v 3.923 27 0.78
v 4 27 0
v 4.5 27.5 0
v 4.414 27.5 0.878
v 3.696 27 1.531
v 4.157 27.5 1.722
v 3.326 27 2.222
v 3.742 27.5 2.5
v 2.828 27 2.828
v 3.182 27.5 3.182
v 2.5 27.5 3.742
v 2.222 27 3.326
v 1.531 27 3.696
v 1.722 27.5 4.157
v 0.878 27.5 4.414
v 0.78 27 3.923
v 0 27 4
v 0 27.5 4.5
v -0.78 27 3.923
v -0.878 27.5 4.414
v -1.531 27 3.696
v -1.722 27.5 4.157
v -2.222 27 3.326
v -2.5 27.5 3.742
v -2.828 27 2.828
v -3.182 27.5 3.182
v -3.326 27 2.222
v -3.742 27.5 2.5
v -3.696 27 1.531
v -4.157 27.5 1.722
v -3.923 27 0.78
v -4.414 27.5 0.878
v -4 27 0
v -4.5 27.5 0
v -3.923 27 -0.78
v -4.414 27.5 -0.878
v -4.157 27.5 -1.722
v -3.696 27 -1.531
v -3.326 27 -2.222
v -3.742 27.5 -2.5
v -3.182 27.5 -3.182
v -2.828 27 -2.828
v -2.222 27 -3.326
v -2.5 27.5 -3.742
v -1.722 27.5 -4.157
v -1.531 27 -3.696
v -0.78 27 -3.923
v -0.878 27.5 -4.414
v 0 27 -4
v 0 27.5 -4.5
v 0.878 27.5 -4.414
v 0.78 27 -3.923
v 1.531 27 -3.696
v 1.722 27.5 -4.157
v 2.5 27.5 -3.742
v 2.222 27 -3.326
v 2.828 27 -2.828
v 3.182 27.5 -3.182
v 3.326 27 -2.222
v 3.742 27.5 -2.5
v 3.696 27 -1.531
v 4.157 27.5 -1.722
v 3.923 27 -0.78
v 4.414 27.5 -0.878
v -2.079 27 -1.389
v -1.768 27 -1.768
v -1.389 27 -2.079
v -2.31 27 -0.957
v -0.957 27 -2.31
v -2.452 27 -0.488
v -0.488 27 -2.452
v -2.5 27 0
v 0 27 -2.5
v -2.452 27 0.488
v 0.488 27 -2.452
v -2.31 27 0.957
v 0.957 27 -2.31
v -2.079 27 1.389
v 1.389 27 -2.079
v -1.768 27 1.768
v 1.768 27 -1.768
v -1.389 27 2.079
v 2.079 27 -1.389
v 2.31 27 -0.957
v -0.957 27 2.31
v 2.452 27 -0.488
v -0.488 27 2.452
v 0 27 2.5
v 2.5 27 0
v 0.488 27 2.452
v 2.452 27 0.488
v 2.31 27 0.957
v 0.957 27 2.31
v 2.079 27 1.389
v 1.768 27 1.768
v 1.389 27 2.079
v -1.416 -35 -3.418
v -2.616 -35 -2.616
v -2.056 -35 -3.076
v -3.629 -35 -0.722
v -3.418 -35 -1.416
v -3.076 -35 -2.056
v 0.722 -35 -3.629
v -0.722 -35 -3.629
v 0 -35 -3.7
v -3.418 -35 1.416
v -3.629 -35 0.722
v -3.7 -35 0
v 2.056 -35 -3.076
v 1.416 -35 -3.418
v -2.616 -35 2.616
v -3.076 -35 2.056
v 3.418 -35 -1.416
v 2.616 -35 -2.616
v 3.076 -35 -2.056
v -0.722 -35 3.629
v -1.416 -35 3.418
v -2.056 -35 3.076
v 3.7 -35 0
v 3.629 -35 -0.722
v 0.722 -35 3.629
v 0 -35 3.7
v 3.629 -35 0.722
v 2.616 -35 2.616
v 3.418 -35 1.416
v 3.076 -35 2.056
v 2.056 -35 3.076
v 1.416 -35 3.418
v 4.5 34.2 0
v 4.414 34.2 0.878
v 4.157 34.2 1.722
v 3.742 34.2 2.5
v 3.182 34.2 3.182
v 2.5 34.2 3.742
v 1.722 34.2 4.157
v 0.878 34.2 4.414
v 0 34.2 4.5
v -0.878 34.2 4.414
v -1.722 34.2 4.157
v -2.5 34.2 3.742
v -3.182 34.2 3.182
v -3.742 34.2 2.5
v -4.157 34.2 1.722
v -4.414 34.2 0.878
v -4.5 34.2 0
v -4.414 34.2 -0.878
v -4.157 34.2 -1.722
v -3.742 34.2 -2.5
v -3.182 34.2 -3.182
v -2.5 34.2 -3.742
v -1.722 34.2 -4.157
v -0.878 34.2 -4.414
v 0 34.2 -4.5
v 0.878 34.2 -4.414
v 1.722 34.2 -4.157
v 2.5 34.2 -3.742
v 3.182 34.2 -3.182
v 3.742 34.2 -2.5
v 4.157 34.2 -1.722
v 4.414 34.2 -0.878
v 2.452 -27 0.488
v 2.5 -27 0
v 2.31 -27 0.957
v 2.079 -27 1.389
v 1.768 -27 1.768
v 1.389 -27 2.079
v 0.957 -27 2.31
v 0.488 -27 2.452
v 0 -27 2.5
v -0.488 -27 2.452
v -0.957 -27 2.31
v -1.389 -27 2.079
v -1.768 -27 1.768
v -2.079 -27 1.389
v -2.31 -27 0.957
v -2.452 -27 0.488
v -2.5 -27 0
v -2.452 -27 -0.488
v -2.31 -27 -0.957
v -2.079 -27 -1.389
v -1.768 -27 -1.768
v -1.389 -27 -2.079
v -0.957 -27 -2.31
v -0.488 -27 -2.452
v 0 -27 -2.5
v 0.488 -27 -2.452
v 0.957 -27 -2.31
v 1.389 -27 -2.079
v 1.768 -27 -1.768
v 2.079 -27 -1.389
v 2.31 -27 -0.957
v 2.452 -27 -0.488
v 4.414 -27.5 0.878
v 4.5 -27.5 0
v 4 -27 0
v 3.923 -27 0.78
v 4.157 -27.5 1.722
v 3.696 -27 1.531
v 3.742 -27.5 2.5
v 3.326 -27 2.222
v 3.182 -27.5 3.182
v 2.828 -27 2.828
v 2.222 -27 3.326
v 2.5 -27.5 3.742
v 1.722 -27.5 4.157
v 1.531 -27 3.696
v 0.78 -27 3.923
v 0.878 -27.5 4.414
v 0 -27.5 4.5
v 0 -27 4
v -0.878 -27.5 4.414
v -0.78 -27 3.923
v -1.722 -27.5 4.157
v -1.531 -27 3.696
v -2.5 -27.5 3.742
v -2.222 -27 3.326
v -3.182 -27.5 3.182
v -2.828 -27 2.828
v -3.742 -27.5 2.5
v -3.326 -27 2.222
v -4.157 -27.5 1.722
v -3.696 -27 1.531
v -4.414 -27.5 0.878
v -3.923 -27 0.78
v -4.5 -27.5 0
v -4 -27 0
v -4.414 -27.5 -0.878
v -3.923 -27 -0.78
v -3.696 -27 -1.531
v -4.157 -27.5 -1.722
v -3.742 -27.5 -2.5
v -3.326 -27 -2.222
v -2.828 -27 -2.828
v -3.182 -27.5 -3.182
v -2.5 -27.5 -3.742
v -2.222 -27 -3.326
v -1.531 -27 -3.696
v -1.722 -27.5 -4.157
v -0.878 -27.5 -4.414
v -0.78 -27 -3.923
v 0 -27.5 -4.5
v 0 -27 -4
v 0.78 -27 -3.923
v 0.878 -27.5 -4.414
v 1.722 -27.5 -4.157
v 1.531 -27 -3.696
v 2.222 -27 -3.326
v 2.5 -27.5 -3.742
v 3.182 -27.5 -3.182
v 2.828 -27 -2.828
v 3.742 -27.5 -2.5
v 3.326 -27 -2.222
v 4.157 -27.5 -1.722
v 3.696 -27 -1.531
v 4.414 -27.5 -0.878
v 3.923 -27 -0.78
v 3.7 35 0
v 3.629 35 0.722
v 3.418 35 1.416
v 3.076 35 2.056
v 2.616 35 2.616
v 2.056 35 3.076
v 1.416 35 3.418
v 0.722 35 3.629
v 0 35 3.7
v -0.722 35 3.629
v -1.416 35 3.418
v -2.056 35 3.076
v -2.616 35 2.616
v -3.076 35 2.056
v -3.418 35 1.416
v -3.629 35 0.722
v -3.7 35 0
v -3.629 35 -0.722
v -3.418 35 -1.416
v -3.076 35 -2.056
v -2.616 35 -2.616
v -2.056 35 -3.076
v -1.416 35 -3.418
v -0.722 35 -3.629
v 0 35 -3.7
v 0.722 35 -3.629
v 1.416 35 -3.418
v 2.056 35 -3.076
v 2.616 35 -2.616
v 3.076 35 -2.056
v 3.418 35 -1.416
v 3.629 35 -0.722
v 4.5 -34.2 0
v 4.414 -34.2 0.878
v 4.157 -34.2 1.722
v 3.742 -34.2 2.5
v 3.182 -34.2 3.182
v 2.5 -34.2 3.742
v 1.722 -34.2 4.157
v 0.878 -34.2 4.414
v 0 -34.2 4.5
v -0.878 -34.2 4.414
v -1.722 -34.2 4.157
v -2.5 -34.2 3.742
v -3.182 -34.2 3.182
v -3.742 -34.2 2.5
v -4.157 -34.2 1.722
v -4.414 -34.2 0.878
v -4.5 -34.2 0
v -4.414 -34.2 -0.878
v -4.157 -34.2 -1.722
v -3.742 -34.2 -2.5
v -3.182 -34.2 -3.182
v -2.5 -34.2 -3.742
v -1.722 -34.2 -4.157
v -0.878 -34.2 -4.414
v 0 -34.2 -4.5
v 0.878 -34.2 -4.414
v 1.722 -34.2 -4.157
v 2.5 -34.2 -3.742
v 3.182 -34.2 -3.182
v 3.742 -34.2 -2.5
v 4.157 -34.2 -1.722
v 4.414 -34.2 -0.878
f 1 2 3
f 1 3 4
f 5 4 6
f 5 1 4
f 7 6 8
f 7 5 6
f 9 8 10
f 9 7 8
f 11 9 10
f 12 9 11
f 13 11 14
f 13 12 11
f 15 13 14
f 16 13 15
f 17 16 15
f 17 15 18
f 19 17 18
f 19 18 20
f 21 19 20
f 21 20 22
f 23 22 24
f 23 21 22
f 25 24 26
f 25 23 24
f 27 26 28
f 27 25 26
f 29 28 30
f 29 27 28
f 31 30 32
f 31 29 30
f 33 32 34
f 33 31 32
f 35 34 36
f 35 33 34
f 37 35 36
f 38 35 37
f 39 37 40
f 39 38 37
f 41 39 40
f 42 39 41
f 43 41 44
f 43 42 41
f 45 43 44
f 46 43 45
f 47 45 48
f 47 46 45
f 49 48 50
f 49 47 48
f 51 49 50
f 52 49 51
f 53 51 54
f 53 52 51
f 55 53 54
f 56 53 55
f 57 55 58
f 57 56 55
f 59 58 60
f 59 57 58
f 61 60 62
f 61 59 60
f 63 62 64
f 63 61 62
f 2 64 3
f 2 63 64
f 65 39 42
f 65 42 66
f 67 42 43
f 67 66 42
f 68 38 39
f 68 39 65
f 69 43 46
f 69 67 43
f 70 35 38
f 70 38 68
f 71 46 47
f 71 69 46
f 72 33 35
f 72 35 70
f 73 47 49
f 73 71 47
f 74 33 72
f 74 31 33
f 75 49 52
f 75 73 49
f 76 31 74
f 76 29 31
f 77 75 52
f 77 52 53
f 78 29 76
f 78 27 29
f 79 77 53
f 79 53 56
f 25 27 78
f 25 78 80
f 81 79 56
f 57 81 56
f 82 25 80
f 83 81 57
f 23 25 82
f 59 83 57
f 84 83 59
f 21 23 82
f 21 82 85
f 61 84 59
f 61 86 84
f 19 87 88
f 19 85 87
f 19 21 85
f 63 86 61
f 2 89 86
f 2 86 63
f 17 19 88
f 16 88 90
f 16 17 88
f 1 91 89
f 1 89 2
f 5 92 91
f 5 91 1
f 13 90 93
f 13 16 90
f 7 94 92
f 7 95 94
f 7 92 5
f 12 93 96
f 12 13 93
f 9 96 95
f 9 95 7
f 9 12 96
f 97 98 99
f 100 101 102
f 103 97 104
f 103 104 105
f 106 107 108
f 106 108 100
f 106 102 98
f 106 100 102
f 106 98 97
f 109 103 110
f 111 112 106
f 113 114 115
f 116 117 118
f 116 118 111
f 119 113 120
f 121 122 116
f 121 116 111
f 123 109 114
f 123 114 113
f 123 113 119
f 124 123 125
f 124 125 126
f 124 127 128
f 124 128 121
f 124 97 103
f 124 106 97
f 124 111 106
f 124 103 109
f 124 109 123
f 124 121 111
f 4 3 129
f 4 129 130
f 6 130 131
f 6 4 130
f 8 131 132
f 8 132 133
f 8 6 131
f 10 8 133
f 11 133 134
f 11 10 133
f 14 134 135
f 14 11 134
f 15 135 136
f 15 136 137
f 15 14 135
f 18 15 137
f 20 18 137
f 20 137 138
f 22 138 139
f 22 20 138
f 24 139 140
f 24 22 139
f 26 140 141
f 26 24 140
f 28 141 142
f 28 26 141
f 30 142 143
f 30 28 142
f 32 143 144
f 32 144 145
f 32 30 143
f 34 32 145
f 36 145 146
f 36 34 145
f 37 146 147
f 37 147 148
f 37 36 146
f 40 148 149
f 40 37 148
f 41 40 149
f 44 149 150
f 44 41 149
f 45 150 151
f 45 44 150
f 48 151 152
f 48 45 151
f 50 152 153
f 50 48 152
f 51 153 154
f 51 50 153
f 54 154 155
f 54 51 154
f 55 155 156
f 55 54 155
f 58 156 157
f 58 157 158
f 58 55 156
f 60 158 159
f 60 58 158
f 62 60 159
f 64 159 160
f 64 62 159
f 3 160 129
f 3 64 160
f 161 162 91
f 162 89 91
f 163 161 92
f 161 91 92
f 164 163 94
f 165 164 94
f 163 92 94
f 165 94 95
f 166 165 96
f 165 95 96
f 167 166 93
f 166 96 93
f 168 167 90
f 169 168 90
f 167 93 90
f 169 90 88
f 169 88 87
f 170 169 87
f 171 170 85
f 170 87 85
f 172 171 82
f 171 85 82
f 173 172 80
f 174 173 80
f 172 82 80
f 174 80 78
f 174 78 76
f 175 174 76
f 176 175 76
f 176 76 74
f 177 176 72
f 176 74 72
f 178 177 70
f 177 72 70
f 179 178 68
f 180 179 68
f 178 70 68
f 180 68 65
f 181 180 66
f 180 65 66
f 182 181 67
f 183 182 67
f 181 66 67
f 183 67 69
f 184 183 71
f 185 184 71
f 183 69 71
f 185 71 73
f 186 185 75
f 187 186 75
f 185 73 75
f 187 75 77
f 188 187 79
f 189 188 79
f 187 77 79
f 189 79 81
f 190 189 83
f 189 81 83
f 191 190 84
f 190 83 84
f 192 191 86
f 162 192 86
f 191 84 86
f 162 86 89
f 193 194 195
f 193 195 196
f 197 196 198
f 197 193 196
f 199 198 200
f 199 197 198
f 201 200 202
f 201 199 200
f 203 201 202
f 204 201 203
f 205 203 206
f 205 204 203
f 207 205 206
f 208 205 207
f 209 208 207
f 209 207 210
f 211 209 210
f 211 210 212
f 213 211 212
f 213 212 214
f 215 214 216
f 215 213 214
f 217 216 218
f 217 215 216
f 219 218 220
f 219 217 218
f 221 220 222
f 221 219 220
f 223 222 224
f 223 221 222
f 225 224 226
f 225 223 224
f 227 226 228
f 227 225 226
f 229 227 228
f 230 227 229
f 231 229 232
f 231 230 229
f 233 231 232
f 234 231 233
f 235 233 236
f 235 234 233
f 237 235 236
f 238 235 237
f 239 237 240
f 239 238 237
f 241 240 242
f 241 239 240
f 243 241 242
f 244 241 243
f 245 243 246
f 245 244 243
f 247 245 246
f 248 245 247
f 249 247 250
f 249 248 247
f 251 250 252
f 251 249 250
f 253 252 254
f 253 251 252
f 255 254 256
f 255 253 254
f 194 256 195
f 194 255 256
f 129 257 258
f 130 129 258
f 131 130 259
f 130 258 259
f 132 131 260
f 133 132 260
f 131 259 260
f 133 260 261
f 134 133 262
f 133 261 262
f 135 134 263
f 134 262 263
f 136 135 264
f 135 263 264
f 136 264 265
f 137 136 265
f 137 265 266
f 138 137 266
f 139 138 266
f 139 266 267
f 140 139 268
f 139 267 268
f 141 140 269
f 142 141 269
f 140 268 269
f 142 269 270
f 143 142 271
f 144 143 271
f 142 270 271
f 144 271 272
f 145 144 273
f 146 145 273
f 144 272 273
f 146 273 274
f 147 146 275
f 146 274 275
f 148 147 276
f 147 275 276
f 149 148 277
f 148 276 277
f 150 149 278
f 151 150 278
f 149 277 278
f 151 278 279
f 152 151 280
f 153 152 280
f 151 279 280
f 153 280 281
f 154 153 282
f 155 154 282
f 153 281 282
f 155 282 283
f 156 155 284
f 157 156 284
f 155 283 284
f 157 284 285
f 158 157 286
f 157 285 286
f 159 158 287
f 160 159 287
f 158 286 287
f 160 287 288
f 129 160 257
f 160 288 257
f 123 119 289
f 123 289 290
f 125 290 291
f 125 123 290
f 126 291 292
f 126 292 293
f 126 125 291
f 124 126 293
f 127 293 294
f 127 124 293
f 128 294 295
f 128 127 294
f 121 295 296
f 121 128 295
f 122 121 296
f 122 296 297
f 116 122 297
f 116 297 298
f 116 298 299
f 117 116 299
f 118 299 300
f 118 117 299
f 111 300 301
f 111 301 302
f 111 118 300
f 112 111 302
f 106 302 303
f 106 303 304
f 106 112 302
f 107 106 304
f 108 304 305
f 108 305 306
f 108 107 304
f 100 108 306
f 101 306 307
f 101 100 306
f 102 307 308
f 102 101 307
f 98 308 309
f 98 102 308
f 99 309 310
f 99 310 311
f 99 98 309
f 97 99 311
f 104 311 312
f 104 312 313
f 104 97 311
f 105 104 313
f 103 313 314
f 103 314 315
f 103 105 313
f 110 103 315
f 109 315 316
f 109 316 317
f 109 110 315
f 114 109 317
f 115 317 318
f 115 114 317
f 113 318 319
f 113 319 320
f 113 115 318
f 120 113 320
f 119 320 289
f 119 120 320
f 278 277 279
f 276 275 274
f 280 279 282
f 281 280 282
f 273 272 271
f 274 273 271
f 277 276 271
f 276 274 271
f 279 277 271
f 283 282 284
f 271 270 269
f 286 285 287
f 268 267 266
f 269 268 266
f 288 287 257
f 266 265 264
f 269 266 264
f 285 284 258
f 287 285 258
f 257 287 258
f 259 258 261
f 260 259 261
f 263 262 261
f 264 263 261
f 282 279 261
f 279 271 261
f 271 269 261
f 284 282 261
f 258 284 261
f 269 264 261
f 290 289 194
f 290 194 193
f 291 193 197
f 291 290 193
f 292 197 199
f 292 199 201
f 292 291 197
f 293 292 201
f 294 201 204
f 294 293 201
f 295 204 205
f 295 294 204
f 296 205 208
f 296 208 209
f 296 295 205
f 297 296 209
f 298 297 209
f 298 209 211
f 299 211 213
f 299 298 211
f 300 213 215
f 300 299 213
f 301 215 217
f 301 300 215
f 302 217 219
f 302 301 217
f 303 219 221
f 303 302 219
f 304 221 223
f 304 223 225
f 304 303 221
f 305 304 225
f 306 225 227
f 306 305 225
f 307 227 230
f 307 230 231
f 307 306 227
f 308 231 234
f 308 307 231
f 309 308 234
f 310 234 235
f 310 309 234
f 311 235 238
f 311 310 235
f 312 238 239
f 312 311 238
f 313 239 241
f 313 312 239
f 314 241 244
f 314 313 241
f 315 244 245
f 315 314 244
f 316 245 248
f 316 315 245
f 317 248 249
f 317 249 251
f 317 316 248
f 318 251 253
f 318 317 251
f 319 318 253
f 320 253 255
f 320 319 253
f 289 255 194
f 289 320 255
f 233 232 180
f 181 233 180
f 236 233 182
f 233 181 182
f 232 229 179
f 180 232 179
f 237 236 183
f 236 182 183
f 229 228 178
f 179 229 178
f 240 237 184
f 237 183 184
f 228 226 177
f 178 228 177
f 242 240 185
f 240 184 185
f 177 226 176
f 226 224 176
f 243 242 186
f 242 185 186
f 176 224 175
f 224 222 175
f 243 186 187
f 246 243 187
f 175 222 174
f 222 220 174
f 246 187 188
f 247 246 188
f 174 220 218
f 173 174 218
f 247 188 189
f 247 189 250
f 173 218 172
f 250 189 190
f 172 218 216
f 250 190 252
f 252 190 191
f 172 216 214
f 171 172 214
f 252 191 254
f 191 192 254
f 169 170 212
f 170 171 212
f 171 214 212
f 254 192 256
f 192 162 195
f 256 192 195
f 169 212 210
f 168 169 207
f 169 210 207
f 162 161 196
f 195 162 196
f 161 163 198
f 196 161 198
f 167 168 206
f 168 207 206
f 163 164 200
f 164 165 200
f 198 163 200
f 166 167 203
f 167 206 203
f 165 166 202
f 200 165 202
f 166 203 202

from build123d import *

# Parameters (mm, degrees)
F0_R     = 4.5
F0_R_2   = 2.5
F1_DEPTH = 35
F2_DEPTH = 27
F3_SIZE  = 0.8
F4_SIZE  = 0.5


with BuildPart() as f1:
    # F0 (on Front) → F1 (new body, symmetric)
    with BuildSketch(Plane.XZ):
        Circle(F0_R)
        Circle(F0_R_2, mode=Mode.SUBTRACT)
        Circle(F0_R_2)
    extrude(amount=F1_DEPTH, both=True)

    # F0 (on Front) → F2 (cut, symmetric)
    with BuildSketch(Plane.XZ):
        Circle(F0_R)
        Circle(F0_R_2, mode=Mode.SUBTRACT)
    extrude(amount=F2_DEPTH, both=True, mode=Mode.SUBTRACT)

    # F3
    f3_edges = [f1.edges().sort_by_distance(p)[0] for p in [
        (-4.5, 35, 0),
        (-4.5, -35, 0),
    ]]
    chamfer(f3_edges, length=F3_SIZE)

    # F4
    f4_edges = [f1.edges().sort_by_distance(p)[0] for p in [
        (-4.5, 27, 0),
        (-4.5, -27, 0),
    ]]
    chamfer(f4_edges, length=F4_SIZE)


solid = f1.part
